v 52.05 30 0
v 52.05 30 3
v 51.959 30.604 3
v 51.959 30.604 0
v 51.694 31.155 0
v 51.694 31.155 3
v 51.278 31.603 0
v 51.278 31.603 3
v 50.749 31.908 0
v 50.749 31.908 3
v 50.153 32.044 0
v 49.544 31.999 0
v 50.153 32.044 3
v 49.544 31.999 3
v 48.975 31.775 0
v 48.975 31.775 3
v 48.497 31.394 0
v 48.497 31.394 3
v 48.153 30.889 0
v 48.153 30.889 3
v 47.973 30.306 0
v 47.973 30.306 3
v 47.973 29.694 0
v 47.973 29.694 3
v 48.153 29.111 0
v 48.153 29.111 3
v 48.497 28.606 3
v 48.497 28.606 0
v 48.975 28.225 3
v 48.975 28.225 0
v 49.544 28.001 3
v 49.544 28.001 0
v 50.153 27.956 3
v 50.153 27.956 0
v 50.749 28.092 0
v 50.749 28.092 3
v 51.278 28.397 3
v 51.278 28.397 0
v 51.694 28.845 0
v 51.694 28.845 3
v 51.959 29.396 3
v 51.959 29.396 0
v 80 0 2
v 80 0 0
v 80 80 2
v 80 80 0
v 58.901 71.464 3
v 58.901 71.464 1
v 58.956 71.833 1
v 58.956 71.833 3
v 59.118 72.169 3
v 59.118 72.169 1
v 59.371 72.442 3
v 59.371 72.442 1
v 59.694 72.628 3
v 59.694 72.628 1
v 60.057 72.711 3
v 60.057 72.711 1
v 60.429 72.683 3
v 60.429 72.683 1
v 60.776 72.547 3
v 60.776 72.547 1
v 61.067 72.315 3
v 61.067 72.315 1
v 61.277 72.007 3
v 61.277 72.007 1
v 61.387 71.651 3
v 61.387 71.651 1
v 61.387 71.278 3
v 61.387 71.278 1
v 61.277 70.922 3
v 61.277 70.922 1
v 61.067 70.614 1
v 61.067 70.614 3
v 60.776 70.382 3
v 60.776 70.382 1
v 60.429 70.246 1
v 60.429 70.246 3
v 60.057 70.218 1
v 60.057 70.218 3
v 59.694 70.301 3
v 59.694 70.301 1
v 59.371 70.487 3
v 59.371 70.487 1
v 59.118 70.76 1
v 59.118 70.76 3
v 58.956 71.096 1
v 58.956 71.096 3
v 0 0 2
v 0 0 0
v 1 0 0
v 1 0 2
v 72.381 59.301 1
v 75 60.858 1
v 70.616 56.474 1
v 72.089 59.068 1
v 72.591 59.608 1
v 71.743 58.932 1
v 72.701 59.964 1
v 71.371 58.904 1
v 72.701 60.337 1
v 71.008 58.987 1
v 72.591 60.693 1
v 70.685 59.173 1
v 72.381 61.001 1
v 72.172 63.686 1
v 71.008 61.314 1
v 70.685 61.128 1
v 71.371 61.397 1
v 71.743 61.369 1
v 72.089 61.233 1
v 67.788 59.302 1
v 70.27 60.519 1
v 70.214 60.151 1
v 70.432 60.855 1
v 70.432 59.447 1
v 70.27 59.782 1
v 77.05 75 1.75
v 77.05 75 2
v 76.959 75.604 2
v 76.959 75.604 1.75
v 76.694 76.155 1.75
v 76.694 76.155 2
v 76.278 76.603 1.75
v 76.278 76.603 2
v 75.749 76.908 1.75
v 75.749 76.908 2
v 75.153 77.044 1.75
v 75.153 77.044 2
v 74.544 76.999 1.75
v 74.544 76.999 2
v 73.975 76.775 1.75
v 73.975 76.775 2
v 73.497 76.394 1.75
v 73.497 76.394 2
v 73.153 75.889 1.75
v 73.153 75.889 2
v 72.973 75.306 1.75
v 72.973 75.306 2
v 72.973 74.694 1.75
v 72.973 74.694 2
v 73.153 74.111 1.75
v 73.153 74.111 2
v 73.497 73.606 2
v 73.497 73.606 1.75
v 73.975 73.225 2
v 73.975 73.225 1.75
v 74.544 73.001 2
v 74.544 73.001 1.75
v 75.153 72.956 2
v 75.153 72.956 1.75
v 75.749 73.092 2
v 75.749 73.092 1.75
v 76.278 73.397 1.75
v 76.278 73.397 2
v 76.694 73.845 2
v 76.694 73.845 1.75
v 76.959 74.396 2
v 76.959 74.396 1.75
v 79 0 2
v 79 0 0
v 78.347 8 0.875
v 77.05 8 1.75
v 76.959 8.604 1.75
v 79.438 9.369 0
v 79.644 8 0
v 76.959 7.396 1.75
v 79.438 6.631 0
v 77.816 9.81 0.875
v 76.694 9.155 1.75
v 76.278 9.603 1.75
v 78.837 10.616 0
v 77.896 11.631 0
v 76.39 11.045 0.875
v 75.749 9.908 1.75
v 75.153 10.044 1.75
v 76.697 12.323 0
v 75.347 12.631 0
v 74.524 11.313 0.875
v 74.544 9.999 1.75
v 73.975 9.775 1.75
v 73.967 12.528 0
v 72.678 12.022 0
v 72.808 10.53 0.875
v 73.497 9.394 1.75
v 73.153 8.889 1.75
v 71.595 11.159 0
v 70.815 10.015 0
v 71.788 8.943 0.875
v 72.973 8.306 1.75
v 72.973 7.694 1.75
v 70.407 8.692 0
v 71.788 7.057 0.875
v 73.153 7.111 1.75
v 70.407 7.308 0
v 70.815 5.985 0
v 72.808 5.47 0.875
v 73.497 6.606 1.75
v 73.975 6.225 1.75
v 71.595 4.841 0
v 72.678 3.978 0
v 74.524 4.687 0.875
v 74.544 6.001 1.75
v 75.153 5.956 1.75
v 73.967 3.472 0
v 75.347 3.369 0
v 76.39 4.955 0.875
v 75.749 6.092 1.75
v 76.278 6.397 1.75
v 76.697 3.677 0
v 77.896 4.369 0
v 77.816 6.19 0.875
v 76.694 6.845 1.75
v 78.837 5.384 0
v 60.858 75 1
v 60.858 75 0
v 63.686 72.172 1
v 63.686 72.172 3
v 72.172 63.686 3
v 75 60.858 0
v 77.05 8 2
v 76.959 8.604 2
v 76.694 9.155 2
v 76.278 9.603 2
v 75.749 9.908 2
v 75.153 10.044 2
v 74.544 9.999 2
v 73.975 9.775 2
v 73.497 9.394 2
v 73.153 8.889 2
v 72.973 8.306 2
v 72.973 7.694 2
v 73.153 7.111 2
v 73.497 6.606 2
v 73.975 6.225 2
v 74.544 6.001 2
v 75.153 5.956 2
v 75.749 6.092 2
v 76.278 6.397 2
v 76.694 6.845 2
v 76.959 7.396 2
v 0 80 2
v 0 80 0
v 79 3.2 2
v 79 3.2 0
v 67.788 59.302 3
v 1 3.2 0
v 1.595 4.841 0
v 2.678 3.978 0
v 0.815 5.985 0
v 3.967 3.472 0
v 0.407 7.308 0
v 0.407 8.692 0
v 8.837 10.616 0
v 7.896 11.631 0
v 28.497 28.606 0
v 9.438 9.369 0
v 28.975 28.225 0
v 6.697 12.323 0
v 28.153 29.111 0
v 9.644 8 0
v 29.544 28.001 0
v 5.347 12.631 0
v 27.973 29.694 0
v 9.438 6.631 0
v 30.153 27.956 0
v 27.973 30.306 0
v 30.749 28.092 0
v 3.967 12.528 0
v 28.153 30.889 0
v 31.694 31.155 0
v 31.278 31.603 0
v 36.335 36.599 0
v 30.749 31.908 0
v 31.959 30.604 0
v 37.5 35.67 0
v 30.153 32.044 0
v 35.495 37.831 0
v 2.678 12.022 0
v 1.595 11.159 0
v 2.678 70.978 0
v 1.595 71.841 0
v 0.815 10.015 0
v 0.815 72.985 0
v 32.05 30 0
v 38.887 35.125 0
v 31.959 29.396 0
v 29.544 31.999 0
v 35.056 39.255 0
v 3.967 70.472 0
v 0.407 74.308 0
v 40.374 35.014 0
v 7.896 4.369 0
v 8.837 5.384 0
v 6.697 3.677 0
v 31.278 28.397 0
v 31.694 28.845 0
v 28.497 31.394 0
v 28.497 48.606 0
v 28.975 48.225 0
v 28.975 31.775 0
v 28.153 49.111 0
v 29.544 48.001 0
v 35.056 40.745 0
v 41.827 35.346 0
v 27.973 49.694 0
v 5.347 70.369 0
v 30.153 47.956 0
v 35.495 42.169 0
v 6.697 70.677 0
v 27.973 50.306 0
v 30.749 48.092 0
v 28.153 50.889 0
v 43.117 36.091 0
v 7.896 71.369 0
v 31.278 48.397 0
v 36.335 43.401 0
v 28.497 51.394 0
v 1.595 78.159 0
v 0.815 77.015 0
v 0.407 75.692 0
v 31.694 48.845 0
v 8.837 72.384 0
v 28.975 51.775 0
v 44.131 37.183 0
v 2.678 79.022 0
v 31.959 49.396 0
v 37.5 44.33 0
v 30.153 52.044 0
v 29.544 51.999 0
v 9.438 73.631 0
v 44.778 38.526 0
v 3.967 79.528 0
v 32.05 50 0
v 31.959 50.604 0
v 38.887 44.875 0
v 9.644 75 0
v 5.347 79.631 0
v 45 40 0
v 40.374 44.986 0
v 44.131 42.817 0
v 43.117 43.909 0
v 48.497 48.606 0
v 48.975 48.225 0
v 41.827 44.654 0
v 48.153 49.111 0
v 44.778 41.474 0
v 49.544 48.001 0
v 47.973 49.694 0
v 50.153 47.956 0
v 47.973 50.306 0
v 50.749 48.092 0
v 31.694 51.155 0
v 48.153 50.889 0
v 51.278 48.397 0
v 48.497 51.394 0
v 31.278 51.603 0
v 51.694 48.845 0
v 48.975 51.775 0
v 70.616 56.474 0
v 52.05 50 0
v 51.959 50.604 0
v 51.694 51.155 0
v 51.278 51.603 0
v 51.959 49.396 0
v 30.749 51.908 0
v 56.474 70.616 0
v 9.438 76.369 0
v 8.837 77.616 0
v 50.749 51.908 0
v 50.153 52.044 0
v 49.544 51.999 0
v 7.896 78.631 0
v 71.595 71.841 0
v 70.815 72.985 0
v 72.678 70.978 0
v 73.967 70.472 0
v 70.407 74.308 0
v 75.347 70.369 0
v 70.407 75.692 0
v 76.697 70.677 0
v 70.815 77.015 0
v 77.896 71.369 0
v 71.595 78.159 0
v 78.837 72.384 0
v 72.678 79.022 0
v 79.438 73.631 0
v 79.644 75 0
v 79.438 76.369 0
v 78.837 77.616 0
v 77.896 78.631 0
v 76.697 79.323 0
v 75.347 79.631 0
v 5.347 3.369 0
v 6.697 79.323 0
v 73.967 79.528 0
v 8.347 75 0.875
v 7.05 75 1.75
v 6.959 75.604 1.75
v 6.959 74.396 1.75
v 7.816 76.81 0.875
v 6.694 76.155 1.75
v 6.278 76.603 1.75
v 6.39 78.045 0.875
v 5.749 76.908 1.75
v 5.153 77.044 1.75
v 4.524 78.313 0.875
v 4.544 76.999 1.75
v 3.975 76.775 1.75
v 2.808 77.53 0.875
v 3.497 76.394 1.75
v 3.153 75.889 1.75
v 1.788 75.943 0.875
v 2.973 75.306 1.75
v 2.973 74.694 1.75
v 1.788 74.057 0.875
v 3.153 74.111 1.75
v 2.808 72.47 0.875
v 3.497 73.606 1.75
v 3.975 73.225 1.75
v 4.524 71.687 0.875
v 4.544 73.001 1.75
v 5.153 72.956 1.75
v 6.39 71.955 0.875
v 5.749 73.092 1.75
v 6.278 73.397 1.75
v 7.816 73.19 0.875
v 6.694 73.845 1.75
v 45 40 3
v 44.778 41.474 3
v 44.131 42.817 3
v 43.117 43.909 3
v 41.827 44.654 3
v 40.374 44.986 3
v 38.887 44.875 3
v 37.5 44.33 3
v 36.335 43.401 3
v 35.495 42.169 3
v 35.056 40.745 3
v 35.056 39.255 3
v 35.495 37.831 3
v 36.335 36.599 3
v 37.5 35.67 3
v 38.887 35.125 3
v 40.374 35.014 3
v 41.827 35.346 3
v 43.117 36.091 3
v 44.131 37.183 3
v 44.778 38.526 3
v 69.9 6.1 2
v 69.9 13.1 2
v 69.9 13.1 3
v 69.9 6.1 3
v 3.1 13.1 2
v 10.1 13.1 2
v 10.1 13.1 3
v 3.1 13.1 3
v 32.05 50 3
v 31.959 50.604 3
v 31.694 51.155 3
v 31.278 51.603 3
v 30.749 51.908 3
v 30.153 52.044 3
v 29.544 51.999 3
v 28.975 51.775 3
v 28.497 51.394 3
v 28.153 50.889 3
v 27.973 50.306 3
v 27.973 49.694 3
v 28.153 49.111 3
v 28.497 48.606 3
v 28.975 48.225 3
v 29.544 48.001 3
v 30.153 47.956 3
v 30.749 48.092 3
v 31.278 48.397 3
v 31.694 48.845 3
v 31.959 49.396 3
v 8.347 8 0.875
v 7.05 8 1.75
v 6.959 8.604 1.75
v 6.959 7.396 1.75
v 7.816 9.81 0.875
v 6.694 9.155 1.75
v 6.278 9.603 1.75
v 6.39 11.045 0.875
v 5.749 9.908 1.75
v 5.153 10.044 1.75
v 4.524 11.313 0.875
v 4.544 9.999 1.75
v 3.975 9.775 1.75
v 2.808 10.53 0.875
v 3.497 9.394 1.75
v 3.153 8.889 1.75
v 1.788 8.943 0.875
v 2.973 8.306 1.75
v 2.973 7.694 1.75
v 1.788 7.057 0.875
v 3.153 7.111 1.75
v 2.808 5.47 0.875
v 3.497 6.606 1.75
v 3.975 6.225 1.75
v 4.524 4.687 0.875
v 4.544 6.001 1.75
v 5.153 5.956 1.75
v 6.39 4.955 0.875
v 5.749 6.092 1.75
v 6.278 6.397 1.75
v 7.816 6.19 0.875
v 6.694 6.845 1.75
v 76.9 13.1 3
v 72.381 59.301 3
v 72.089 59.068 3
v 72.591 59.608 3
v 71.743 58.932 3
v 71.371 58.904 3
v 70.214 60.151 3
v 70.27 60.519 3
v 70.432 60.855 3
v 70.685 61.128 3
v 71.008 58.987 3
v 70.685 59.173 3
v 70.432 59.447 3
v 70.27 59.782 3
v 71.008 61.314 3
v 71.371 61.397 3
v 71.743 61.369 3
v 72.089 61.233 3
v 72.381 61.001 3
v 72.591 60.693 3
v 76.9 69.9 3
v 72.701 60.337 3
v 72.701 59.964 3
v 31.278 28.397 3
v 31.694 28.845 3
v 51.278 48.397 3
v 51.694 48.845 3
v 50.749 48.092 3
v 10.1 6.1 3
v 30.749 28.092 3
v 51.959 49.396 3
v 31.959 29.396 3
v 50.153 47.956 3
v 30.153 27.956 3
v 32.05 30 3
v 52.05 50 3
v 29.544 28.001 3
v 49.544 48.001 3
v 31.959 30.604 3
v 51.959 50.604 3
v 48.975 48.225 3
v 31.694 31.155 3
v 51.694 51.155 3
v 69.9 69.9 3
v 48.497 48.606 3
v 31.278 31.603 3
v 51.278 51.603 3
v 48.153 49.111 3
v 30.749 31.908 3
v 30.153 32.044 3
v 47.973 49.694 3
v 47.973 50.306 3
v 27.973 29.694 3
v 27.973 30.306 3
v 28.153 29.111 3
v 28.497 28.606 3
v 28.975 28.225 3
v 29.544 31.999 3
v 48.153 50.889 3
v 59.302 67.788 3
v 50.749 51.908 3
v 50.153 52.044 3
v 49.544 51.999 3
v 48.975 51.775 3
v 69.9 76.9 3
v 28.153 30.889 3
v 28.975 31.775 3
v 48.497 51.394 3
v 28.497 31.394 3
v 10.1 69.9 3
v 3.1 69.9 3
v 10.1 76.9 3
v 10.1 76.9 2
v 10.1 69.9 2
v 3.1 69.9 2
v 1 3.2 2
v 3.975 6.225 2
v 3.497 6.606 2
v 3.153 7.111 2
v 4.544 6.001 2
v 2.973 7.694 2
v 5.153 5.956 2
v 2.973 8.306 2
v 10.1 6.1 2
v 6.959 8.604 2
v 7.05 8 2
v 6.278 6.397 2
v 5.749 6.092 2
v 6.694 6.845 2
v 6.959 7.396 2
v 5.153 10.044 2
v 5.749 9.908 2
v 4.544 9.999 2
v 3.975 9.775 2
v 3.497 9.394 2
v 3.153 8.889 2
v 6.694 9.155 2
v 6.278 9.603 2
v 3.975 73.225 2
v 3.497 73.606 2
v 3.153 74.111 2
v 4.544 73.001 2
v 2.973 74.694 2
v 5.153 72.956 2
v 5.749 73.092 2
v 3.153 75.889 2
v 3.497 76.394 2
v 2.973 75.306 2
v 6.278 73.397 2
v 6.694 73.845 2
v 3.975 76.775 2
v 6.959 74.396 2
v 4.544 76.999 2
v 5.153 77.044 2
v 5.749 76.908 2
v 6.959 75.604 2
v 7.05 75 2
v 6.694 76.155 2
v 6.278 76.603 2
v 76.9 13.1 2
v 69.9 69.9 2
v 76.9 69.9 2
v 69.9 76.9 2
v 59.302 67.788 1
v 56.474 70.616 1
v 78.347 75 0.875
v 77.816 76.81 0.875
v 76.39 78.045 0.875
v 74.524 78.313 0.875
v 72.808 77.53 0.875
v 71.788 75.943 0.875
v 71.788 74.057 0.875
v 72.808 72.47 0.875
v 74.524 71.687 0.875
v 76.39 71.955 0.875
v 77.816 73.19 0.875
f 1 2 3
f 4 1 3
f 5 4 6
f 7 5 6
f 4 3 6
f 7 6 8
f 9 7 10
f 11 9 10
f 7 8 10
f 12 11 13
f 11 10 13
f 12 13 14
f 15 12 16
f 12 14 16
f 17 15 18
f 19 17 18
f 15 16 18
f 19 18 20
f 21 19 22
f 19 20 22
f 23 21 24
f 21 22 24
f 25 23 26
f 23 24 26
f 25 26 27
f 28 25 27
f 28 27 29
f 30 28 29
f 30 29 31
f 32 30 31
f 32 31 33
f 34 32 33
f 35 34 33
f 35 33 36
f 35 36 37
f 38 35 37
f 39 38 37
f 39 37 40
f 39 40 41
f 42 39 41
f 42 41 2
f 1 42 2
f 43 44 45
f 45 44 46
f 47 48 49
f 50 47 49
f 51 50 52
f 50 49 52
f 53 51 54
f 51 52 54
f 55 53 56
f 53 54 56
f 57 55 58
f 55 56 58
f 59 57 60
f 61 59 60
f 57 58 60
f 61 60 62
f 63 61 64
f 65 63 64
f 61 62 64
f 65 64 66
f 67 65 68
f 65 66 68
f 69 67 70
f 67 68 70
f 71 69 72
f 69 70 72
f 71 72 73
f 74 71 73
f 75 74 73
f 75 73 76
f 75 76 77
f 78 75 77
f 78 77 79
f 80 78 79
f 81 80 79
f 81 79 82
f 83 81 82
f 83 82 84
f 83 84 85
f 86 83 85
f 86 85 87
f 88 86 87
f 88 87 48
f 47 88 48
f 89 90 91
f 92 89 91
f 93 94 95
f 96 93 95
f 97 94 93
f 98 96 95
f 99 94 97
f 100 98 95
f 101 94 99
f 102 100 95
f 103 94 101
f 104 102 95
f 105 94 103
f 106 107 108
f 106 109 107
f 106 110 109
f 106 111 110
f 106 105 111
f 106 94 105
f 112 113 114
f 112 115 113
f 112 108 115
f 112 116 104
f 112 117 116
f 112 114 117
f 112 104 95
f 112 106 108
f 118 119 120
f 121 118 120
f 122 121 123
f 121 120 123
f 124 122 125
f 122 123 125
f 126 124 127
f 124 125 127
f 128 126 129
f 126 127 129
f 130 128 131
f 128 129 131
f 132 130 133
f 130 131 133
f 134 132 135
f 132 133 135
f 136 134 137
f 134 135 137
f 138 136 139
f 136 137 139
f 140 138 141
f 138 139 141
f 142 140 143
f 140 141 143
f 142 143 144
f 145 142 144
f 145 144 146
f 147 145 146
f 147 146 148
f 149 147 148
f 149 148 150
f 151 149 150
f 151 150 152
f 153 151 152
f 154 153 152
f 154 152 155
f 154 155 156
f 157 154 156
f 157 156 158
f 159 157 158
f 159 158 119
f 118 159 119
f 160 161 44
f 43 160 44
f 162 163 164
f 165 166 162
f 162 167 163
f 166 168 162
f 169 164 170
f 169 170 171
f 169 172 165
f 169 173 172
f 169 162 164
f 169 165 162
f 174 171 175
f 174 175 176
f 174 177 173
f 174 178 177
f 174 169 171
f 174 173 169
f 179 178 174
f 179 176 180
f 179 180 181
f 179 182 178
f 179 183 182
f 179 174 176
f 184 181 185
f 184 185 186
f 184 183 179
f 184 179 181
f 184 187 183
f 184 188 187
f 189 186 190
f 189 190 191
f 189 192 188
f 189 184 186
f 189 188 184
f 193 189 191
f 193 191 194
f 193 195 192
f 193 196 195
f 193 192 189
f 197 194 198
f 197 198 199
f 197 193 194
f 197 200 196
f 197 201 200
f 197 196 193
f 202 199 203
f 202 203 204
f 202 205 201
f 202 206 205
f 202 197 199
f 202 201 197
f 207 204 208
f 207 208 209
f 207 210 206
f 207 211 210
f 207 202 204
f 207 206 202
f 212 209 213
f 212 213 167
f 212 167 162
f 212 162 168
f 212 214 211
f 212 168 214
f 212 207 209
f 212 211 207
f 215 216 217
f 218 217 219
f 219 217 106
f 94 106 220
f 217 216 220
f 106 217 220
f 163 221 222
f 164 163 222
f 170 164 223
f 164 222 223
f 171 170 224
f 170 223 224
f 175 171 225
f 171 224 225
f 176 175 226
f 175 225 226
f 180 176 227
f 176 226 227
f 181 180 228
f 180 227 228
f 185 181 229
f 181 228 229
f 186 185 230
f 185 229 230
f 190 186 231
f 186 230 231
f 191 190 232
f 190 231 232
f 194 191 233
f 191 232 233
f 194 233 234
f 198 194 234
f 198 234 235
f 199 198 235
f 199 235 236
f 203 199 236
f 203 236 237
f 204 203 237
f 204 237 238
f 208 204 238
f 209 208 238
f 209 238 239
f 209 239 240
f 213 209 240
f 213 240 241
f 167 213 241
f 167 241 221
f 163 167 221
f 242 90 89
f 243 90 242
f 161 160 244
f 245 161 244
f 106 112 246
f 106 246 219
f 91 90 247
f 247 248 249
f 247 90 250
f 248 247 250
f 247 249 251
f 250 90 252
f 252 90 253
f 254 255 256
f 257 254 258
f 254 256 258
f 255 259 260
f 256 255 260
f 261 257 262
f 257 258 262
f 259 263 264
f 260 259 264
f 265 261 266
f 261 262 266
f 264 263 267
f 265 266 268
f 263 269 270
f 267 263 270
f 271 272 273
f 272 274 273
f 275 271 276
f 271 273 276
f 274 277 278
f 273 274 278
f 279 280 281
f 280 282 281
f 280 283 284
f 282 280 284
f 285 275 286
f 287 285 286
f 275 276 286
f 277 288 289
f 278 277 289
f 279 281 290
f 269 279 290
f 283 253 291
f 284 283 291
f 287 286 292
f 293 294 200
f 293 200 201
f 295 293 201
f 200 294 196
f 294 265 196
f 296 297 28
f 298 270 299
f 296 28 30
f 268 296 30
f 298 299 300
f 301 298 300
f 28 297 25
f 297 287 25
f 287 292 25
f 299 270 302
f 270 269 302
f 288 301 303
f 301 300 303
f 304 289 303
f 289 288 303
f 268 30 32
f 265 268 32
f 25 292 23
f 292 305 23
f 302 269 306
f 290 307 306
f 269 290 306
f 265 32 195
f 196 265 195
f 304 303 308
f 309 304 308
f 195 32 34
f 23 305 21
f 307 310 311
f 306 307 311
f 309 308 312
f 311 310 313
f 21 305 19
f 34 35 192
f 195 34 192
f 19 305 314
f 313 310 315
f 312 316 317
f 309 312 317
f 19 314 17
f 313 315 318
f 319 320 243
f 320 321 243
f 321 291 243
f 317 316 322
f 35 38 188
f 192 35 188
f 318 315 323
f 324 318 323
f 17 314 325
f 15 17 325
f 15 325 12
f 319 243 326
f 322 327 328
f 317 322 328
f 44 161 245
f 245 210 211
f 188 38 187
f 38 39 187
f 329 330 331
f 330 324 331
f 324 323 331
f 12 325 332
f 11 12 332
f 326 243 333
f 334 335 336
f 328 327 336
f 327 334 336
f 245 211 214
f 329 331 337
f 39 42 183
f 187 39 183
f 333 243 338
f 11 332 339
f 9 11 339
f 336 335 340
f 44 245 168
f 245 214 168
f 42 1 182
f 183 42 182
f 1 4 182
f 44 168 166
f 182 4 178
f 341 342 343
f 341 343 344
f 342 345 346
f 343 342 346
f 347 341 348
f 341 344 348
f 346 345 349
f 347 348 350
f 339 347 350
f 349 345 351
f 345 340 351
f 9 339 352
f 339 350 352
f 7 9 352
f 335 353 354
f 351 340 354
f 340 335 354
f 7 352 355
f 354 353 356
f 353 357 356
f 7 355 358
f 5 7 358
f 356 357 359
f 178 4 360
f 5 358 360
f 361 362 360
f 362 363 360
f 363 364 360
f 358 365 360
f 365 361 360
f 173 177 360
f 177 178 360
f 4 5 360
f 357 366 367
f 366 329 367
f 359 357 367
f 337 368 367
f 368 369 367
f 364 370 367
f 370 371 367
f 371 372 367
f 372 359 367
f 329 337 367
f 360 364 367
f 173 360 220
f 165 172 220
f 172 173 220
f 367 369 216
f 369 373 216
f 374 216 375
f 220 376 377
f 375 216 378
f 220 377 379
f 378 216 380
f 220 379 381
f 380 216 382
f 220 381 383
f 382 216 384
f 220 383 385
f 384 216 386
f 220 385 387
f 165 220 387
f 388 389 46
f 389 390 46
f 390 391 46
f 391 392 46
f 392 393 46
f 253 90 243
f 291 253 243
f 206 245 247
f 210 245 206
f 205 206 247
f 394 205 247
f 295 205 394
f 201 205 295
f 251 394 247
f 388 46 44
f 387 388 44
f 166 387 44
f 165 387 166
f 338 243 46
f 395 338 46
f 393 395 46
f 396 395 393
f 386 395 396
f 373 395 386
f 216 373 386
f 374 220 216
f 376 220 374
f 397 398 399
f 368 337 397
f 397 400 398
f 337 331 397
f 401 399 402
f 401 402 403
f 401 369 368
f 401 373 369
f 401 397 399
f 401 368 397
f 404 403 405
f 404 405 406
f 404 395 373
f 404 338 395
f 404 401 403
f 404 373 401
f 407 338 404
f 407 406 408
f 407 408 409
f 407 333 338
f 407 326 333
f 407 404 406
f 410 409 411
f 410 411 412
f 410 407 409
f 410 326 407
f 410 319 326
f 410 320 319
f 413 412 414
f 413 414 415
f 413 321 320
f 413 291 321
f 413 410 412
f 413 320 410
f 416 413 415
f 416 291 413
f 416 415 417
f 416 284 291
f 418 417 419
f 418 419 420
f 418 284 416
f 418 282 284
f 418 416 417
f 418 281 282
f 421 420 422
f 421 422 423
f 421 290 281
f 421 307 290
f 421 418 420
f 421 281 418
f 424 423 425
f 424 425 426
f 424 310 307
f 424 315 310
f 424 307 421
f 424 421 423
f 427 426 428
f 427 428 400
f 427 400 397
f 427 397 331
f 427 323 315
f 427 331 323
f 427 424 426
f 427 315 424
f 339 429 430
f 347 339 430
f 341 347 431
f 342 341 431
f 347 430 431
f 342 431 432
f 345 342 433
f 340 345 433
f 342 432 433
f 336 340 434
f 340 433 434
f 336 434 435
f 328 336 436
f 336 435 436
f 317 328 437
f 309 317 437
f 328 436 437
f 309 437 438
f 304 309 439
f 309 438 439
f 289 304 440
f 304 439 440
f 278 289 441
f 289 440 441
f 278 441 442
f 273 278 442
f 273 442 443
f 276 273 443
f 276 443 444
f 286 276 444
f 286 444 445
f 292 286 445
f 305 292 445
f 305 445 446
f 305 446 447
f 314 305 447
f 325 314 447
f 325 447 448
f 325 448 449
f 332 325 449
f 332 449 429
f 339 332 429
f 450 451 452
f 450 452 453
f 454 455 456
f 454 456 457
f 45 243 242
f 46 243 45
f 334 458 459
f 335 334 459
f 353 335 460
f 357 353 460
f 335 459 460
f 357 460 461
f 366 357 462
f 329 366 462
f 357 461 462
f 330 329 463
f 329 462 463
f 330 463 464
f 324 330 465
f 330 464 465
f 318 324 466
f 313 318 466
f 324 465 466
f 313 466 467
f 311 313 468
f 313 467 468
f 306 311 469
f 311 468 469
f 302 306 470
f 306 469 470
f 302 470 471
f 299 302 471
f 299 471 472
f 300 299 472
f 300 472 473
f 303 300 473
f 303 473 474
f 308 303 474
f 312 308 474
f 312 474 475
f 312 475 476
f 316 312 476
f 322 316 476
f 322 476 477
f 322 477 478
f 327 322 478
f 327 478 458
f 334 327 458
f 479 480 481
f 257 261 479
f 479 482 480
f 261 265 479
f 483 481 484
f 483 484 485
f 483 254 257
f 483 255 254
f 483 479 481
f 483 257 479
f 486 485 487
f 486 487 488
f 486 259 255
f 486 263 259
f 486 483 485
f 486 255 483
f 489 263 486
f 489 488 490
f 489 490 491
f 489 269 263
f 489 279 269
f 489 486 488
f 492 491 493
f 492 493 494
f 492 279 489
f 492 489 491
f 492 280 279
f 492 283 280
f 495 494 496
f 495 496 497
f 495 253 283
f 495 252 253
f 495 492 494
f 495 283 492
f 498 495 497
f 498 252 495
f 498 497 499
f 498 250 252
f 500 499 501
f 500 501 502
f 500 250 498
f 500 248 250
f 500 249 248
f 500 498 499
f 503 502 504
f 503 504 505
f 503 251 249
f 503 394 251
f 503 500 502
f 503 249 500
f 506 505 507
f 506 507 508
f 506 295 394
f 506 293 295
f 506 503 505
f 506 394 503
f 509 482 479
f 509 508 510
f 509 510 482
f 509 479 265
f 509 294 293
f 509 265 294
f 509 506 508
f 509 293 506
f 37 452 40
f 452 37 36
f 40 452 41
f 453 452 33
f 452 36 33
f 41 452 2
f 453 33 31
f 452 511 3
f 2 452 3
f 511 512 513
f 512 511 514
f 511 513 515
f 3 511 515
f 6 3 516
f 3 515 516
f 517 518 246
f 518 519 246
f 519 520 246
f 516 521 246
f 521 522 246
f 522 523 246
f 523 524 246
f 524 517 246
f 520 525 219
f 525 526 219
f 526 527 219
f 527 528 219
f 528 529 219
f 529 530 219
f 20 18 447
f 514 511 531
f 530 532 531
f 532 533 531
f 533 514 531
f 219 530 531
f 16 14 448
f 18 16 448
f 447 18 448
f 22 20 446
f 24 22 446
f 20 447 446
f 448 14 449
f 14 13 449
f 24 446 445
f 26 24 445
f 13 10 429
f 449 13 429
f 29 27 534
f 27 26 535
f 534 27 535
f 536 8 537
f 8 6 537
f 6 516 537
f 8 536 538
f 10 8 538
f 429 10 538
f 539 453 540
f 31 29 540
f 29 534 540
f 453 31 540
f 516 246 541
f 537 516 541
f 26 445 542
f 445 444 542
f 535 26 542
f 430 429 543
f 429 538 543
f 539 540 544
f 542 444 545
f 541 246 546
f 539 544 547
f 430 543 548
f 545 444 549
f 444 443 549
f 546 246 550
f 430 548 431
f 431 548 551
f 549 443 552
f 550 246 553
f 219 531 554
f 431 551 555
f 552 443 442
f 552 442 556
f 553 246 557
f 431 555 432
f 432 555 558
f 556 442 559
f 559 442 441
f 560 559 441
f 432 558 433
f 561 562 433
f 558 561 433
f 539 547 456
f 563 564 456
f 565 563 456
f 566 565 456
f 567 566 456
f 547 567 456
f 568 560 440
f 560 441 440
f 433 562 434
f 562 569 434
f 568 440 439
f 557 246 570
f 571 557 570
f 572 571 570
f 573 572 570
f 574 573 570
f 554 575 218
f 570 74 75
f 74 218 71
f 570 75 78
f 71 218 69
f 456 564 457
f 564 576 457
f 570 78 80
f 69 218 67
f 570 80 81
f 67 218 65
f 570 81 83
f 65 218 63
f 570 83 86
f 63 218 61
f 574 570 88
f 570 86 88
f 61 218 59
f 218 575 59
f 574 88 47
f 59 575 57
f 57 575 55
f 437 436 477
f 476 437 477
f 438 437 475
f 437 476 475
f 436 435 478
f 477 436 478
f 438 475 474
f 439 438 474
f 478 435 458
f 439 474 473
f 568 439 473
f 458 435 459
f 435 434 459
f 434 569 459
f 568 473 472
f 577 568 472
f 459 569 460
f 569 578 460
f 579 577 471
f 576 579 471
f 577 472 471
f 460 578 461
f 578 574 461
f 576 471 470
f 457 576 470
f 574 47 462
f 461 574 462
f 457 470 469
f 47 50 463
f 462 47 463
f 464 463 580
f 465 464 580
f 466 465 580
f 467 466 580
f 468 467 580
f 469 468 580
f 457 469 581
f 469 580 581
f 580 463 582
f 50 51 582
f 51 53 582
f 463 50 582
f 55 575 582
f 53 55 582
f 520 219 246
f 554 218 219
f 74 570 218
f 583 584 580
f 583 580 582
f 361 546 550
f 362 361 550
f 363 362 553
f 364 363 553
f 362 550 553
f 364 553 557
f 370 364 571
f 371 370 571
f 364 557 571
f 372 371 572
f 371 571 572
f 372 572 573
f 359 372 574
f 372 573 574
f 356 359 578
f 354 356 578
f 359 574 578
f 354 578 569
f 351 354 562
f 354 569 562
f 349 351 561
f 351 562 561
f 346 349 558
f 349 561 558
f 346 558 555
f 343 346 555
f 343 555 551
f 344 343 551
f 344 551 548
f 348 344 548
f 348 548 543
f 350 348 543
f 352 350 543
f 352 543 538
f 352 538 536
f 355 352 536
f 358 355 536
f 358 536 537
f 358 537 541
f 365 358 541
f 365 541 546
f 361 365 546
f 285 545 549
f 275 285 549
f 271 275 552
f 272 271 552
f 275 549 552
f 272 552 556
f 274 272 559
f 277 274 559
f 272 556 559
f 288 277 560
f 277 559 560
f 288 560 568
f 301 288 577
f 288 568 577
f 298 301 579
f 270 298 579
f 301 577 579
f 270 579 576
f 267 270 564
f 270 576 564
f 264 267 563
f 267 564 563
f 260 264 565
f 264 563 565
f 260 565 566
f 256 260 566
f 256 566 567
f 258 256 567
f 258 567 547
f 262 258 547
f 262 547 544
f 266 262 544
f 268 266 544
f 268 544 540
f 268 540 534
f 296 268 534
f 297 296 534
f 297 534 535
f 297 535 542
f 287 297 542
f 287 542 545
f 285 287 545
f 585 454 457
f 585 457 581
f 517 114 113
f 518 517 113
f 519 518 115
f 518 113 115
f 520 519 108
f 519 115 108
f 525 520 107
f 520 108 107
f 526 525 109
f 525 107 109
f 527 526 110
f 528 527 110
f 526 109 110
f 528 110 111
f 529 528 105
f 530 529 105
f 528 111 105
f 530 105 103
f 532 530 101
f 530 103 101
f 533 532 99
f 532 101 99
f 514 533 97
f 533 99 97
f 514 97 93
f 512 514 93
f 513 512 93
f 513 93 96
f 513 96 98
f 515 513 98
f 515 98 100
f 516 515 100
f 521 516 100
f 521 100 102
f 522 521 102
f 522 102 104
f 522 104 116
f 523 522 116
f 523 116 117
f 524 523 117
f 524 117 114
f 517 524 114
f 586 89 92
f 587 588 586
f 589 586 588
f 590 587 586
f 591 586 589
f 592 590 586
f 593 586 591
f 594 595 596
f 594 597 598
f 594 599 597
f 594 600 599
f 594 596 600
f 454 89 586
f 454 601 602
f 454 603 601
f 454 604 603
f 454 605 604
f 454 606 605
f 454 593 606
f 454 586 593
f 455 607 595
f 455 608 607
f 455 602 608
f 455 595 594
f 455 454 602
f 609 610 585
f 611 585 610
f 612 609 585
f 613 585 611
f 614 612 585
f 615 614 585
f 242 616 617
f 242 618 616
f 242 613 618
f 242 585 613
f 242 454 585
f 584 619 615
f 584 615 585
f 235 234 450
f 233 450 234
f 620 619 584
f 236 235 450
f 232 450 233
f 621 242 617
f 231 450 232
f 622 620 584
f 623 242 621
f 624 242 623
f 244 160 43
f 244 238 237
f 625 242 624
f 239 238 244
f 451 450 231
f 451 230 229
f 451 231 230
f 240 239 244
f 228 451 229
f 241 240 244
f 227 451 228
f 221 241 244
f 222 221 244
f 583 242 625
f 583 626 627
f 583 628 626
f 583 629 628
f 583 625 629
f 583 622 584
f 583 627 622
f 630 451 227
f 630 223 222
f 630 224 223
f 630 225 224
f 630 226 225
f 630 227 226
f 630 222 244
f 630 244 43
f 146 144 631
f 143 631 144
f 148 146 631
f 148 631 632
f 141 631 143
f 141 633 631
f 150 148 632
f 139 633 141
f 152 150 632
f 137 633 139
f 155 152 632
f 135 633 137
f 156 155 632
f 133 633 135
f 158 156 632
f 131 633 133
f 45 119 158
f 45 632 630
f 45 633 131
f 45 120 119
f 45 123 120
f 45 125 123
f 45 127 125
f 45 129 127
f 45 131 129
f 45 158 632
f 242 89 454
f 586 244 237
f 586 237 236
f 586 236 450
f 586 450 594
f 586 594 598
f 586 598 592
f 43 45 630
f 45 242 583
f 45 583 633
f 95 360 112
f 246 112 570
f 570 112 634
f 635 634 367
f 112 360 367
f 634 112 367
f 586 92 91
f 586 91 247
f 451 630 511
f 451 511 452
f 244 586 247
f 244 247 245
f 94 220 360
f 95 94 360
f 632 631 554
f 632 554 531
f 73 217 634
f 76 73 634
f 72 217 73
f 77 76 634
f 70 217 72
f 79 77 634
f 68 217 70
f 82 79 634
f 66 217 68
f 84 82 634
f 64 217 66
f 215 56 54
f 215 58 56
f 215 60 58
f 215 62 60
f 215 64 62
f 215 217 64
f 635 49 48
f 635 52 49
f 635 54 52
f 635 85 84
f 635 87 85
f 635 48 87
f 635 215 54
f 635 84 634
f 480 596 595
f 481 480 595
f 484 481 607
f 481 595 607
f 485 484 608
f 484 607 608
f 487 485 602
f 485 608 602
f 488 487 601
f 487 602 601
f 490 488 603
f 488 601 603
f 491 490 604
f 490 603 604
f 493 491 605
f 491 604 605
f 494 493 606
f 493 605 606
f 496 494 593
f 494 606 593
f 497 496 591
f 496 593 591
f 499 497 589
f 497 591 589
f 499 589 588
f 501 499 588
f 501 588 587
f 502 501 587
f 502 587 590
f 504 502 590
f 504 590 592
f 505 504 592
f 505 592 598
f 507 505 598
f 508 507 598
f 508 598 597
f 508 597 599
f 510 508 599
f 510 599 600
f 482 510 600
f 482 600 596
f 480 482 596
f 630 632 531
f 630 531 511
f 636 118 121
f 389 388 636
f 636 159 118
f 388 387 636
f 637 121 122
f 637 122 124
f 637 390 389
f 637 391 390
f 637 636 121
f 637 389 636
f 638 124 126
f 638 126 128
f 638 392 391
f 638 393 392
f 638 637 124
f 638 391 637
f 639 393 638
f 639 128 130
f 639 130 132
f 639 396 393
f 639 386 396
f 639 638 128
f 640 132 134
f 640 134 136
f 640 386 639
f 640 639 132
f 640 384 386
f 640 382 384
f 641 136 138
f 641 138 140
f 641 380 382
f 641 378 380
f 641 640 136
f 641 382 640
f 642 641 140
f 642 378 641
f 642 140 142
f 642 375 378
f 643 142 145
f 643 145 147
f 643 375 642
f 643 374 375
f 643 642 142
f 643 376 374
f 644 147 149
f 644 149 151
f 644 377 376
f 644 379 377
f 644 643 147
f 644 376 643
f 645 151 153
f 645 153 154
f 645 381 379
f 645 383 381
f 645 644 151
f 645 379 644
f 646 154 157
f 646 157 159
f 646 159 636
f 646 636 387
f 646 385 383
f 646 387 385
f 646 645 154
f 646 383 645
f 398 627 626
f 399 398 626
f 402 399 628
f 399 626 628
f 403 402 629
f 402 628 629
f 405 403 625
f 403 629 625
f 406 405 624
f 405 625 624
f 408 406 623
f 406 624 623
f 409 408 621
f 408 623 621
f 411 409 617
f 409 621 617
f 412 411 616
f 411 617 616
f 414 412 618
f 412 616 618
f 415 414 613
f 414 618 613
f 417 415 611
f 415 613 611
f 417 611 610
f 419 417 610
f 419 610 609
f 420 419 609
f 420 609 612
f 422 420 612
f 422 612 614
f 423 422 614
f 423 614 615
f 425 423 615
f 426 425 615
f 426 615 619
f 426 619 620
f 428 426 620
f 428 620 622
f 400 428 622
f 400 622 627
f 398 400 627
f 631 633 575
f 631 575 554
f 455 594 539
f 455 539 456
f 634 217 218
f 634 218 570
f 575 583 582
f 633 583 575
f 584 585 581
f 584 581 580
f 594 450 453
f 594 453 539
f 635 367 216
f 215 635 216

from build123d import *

# Parameters (mm, degrees)
ESQUISSE1_W             = 80
ESQUISSE1_H             = 80
BOSS_EXTRU_1_DEPTH      = 2
BOSS_EXTRU_2_DEPTH      = 1
ESQUISSE3_R             = 2.05
ESQUISSE3_W             = 78
ESQUISSE3_H             = 3.2
ENL_V_MAT_EXTRU_1_DEPTH = 3
ESQUISSE4_R             = 5
ESQUISSE4_R_2           = 2.05
ENL_V_MAT_EXTRU_2_DEPTH = 4
CHANFREIN1_SIZE         = 1.75
CHANFREIN1_SIZE2        = 2.594481695
CHANFREIN1_PART_2_SIZE  = 1.75
CHANFREIN1_PART_2_SIZE2 = 2.594481695
CHANFREIN1_PART_3_SIZE  = 1.75
CHANFREIN1_PART_3_SIZE2 = 2.594481695
CHANFREIN1_PART_4_SIZE  = 1.75
CHANFREIN1_PART_4_SIZE2 = 2.594481695
ENL_V_MAT_EXTRU_3_DEPTH = 1
ESQUISSE8_R             = 1.25
ENL_V_MAT_EXTRU_4_DEPTH = 3


with BuildPart() as part:
    # Esquisse1 → Boss.-Extru.1 (new body)
    with BuildSketch(Plane.XY):
        with Locations((40, 40)):
            Rectangle(ESQUISSE1_W, ESQUISSE1_H)
    extrude(amount=BOSS_EXTRU_1_DEPTH)

    # Esquisse2 → Boss.-Extru.2 (add)
    with BuildSketch(Plane.XY.offset(2)):
        Polygon((10.1, 6.1), (10.1, 13.1), (3.1, 13.1), (3.1, 69.9), (10.1, 69.9), (10.1, 76.9), (69.9, 76.9), (69.9, 69.9), (76.9, 69.9), (76.9, 13.1), (69.9, 13.1), (69.9, 6.1), align=None)
    extrude(amount=BOSS_EXTRU_2_DEPTH)

    # Esquisse3 → Enlèv. mat.-Extru.1 (cut, through all)
    with BuildSketch(Plane.XY.offset(2)):
        with Locations((5, 75)):
            Circle(ESQUISSE3_R)
        with Locations((75, 75)):
            Circle(ESQUISSE3_R)
        with Locations((75, 8)):
            Circle(ESQUISSE3_R)
        with Locations((5, 8)):
            Circle(ESQUISSE3_R)
        with Locations((40, 1.6)):
            Rectangle(ESQUISSE3_W, ESQUISSE3_H)
    extrude(amount=-ENL_V_MAT_EXTRU_1_DEPTH, mode=Mode.SUBTRACT)

    # Esquisse4 → Enlèv. mat.-Extru.2 (cut, through all)
    with BuildSketch(Plane.XY.offset(3)):
        with Locations((40, 40)):
            Circle(ESQUISSE4_R)
        with Locations((30, 50)):
            Circle(ESQUISSE4_R_2)
        with Locations((30, 30)):
            Circle(ESQUISSE4_R_2)
        with Locations((50, 30)):
            Circle(ESQUISSE4_R_2)
        with Locations((50, 50)):
            Circle(ESQUISSE4_R_2)
    extrude(amount=-ENL_V_MAT_EXTRU_2_DEPTH, mode=Mode.SUBTRACT)

    # Chanfrein1
    chanfrein1_edges = [part.edges().sort_by_distance(p)[0] for p in [
        (2.95, 75, 0),
    ]]
    chanfrein1_side = [part.faces().sort_by_distance(p)[0] for p in [
        (2.95, 75, 1),
    ]]
    chamfer(chanfrein1_edges, length=CHANFREIN1_SIZE, length2=CHANFREIN1_SIZE2, reference=chanfrein1_side[0])

    # Chanfrein1 part 2
    chanfrein1_part_2_edges = [part.edges().sort_by_distance(p)[0] for p in [
        (72.95, 75, 0),
    ]]
    chanfrein1_part_2_side = [part.faces().sort_by_distance(p)[0] for p in [
        (72.95, 75, 1),
    ]]
    chamfer(chanfrein1_part_2_edges, length=CHANFREIN1_PART_2_SIZE, length2=CHANFREIN1_PART_2_SIZE2, reference=chanfrein1_part_2_side[0])

    # Chanfrein1 part 3
    chanfrein1_part_3_edges = [part.edges().sort_by_distance(p)[0] for p in [
        (72.95, 8, 0),
    ]]
    chanfrein1_part_3_side = [part.faces().sort_by_distance(p)[0] for p in [
        (72.95, 8, 1),
    ]]
    chamfer(chanfrein1_part_3_edges, length=CHANFREIN1_PART_3_SIZE, length2=CHANFREIN1_PART_3_SIZE2, reference=chanfrein1_part_3_side[0])

    # Chanfrein1 part 4
    chanfrein1_part_4_edges = [part.edges().sort_by_distance(p)[0] for p in [
        (2.95, 8, 0),
    ]]
    chanfrein1_part_4_side = [part.faces().sort_by_distance(p)[0] for p in [
        (2.95, 8, 1),
    ]]
    chamfer(chanfrein1_part_4_edges, length=CHANFREIN1_PART_4_SIZE, length2=CHANFREIN1_PART_4_SIZE2, reference=chanfrein1_part_4_side[0])

    # Esquisse6 → Enlèv. mat.-Extru.3 (cut)
    with BuildSketch(Plane(origin=(0, 0, 0), x_dir=(-1, 0, 0), z_dir=(0, 0, -1))):
        Polygon((-70.615937957, 56.473802333), (-56.473802333, 70.615937957), (-60.857864376, 75), (-75, 60.857864376), align=None)
    extrude(amount=-ENL_V_MAT_EXTRU_3_DEPTH, mode=Mode.SUBTRACT)

    # Esquisse8 → Enlèv. mat.-Extru.4 (cut, through all)
    with BuildSketch(Plane(origin=(0, 0, 1), x_dir=(-1, 0, 0), z_dir=(0, 0, -1))):
        with Locations((-60.150757595, 71.464466094)):
            Circle(ESQUISSE8_R)
        with Locations((-71.464466094, 60.150757595)):
            Circle(ESQUISSE8_R)
        Polygon((-67.787510832, 59.302229458), (-72.171572875, 63.686291501), (-63.686291501, 72.171572875), (-59.302229458, 67.787510832), align=None)
    extrude(amount=-ENL_V_MAT_EXTRU_4_DEPTH, mode=Mode.SUBTRACT)


solid = part.part
